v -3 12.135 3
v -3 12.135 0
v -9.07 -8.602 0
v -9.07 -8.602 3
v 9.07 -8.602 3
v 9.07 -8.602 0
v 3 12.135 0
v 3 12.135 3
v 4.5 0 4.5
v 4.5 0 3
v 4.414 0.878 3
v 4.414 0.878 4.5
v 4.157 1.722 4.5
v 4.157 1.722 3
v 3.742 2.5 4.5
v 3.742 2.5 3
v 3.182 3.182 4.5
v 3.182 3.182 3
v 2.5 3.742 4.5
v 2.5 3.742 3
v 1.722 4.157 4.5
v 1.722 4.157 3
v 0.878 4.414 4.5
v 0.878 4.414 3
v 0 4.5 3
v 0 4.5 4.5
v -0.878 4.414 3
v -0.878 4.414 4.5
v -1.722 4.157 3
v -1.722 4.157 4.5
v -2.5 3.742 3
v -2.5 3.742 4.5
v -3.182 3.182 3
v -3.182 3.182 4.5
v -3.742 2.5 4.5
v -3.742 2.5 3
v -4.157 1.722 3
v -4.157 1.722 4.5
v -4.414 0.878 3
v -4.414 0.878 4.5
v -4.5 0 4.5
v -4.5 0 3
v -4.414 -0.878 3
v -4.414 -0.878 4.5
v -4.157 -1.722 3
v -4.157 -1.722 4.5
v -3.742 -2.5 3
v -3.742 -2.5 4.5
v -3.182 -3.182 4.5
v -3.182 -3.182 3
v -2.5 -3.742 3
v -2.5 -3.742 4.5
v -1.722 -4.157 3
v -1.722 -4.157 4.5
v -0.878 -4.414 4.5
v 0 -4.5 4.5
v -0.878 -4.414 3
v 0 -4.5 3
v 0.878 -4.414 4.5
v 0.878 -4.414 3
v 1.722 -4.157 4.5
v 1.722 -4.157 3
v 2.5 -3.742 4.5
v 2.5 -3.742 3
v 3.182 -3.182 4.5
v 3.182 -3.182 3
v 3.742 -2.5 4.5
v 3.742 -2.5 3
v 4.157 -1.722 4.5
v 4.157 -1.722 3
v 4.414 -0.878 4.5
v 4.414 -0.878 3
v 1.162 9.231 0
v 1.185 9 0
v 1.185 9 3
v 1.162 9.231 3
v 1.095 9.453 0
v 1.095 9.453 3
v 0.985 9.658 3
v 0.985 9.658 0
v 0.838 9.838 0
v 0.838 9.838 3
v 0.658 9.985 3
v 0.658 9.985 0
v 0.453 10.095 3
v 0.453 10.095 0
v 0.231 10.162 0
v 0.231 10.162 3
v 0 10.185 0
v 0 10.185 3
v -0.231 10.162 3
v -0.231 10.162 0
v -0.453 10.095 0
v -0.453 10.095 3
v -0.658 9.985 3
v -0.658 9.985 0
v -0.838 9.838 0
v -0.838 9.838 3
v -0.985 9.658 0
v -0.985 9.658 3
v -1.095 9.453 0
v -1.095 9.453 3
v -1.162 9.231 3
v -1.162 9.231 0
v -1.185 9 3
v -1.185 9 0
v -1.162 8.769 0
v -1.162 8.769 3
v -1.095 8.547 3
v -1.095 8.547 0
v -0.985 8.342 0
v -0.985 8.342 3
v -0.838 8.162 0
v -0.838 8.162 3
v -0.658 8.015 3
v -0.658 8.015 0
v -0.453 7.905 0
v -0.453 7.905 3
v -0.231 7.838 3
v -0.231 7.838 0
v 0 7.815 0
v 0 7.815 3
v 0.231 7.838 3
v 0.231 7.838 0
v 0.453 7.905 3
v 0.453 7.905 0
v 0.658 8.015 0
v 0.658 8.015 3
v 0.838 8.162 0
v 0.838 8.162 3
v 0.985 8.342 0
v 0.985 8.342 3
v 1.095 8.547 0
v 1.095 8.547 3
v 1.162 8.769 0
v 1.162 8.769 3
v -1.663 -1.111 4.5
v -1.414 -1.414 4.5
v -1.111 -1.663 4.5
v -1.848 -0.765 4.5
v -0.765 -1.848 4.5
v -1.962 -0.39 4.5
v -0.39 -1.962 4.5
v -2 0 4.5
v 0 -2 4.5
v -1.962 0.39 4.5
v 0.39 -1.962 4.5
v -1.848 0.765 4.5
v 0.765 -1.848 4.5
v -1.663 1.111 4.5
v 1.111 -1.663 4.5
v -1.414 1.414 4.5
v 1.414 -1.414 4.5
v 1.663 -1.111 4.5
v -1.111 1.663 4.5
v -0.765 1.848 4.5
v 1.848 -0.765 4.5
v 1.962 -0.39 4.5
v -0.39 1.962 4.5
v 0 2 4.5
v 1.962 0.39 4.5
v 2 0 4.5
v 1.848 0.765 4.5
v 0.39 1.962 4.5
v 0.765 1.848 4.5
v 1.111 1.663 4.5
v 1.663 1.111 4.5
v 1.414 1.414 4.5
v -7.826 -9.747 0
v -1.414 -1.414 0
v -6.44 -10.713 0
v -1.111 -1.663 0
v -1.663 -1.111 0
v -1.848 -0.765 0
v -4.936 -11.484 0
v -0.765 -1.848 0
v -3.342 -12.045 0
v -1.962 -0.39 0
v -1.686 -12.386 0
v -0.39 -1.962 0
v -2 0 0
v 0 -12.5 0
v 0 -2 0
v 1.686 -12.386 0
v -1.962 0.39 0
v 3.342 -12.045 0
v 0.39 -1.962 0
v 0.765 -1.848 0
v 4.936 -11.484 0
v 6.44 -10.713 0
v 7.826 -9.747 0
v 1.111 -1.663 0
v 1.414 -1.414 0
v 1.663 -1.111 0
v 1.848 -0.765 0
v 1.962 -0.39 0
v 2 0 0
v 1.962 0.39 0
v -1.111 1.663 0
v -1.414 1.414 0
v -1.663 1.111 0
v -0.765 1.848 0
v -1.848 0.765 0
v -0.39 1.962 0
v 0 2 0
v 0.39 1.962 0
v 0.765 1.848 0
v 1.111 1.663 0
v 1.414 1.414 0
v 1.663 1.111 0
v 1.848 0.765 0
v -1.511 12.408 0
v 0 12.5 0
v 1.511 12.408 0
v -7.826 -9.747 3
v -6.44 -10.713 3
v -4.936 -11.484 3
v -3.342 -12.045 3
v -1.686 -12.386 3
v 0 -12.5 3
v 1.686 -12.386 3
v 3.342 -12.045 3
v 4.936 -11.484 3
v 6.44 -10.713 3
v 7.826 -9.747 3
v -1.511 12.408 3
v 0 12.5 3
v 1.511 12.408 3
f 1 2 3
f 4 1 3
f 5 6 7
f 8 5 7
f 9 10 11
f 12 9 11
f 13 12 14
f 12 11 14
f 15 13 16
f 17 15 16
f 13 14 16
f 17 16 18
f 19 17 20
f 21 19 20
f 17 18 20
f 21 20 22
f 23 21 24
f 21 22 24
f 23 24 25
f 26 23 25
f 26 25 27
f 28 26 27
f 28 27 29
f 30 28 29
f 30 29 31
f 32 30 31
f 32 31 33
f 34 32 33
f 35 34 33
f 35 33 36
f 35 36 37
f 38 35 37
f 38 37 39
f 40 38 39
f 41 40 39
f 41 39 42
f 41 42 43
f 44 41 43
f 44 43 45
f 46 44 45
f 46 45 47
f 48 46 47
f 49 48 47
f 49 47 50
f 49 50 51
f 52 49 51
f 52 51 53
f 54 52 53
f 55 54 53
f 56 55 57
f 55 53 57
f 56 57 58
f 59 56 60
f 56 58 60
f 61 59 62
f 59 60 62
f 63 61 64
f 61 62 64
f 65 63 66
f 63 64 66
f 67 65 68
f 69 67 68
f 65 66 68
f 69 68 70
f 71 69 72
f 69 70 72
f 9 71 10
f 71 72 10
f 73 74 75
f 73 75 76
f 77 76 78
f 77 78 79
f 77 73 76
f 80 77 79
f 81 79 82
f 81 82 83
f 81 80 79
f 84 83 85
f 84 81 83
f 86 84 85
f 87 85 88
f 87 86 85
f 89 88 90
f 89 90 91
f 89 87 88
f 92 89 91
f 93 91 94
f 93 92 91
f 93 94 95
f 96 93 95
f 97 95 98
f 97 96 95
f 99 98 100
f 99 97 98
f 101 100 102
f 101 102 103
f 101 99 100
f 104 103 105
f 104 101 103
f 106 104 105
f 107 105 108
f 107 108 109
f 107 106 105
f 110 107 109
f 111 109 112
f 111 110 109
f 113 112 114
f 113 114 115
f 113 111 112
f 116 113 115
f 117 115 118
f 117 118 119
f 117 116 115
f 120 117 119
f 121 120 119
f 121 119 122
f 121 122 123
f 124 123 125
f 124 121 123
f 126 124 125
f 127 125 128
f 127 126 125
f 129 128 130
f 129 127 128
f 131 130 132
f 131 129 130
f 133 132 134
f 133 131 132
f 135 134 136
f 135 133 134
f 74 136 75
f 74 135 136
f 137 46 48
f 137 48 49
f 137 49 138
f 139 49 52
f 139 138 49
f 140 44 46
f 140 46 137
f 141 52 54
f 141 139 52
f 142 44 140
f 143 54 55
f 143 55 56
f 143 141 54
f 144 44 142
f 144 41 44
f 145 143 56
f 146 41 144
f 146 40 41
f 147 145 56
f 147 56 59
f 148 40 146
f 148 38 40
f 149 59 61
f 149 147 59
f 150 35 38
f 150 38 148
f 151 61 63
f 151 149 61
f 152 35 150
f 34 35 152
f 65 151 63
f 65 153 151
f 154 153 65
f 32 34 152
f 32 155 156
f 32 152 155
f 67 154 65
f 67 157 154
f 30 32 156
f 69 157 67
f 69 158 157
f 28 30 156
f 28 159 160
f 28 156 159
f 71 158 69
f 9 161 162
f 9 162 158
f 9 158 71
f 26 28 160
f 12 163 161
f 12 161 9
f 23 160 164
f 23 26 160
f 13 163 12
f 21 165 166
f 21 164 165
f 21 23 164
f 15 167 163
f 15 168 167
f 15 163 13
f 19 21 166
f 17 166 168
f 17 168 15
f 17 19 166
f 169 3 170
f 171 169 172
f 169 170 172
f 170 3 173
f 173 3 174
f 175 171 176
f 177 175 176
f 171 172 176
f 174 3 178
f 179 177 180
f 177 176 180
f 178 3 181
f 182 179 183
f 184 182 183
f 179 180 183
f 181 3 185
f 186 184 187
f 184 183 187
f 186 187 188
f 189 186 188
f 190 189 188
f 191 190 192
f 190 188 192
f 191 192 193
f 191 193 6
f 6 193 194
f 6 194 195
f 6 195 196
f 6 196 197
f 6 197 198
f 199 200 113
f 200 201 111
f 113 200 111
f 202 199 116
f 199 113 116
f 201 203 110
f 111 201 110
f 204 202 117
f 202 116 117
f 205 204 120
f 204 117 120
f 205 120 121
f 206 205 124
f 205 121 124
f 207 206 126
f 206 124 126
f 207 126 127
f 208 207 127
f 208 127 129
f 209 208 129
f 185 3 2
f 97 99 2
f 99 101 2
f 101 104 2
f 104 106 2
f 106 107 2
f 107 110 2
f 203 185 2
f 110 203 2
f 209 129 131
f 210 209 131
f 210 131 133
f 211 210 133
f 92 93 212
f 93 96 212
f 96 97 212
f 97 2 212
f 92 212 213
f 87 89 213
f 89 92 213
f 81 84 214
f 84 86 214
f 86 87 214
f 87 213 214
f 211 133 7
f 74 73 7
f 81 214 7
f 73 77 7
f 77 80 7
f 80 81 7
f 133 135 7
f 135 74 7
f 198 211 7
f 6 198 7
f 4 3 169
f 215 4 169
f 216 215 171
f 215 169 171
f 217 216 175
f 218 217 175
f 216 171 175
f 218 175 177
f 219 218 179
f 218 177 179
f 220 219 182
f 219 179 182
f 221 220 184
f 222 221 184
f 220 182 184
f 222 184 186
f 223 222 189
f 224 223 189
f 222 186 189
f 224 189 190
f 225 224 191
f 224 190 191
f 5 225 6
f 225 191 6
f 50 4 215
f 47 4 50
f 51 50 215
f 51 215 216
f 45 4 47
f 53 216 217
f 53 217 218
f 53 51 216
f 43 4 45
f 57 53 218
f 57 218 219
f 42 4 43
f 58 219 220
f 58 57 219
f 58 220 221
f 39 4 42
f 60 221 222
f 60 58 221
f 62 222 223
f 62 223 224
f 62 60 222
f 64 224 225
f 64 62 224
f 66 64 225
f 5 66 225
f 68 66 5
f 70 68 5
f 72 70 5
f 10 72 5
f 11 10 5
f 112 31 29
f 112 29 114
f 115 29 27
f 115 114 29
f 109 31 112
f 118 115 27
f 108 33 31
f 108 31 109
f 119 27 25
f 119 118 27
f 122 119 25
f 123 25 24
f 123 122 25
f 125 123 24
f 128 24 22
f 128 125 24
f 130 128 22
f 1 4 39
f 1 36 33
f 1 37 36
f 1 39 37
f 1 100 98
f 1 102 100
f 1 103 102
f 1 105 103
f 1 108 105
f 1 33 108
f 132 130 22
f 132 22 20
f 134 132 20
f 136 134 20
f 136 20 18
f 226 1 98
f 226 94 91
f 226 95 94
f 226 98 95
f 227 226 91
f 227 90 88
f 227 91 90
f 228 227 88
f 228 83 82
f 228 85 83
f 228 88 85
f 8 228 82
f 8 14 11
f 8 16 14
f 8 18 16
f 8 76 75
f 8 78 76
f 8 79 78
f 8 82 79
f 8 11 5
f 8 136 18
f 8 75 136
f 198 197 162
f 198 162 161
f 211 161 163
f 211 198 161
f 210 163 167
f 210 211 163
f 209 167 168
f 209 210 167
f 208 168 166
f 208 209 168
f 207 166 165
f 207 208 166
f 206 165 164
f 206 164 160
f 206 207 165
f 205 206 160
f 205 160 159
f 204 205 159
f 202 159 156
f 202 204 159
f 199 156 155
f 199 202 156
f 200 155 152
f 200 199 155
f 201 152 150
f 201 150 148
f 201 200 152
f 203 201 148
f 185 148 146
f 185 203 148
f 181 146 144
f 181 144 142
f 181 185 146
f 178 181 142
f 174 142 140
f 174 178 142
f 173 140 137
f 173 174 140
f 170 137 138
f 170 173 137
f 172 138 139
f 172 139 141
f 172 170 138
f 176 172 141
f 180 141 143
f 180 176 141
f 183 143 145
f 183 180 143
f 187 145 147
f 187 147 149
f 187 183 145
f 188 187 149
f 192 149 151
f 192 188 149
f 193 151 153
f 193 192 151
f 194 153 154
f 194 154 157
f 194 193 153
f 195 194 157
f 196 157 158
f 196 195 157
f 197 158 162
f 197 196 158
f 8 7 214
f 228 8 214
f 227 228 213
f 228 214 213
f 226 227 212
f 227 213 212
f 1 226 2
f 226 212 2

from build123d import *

# Parameters (mm, degrees)
F0_R     = 4.5
F0_R_2   = 1.185
F1_DEPTH = 3
F0_R_3   = 2
F2_DEPTH = 4.5


with BuildPart() as f1:
    # F0 (on Top) → F1 (new body)
    with BuildSketch(Plane.XY):
        with BuildLine():
            Line((-3, 12.134661), (-9.06962, -8.60186))
            ThreePointArc((-9.06962, -8.60186), (0, -12.5), (9.06962, -8.60186))
            Line((9.06962, -8.60186), (3, 12.134661))
            ThreePointArc((3, 12.134661), (0, 12.5), (-3, 12.134661))
        make_face()
        Circle(F0_R, mode=Mode.SUBTRACT)
        with Locations((0, 9)):
            Circle(F0_R_2, mode=Mode.SUBTRACT)
    extrude(amount=F1_DEPTH)

    # F0 (on Top) → F2 (join)
    with BuildSketch(Plane.XY):
        Circle(F0_R)
        Circle(F0_R_3, mode=Mode.SUBTRACT)
    extrude(amount=F2_DEPTH)


solid = f1.part
